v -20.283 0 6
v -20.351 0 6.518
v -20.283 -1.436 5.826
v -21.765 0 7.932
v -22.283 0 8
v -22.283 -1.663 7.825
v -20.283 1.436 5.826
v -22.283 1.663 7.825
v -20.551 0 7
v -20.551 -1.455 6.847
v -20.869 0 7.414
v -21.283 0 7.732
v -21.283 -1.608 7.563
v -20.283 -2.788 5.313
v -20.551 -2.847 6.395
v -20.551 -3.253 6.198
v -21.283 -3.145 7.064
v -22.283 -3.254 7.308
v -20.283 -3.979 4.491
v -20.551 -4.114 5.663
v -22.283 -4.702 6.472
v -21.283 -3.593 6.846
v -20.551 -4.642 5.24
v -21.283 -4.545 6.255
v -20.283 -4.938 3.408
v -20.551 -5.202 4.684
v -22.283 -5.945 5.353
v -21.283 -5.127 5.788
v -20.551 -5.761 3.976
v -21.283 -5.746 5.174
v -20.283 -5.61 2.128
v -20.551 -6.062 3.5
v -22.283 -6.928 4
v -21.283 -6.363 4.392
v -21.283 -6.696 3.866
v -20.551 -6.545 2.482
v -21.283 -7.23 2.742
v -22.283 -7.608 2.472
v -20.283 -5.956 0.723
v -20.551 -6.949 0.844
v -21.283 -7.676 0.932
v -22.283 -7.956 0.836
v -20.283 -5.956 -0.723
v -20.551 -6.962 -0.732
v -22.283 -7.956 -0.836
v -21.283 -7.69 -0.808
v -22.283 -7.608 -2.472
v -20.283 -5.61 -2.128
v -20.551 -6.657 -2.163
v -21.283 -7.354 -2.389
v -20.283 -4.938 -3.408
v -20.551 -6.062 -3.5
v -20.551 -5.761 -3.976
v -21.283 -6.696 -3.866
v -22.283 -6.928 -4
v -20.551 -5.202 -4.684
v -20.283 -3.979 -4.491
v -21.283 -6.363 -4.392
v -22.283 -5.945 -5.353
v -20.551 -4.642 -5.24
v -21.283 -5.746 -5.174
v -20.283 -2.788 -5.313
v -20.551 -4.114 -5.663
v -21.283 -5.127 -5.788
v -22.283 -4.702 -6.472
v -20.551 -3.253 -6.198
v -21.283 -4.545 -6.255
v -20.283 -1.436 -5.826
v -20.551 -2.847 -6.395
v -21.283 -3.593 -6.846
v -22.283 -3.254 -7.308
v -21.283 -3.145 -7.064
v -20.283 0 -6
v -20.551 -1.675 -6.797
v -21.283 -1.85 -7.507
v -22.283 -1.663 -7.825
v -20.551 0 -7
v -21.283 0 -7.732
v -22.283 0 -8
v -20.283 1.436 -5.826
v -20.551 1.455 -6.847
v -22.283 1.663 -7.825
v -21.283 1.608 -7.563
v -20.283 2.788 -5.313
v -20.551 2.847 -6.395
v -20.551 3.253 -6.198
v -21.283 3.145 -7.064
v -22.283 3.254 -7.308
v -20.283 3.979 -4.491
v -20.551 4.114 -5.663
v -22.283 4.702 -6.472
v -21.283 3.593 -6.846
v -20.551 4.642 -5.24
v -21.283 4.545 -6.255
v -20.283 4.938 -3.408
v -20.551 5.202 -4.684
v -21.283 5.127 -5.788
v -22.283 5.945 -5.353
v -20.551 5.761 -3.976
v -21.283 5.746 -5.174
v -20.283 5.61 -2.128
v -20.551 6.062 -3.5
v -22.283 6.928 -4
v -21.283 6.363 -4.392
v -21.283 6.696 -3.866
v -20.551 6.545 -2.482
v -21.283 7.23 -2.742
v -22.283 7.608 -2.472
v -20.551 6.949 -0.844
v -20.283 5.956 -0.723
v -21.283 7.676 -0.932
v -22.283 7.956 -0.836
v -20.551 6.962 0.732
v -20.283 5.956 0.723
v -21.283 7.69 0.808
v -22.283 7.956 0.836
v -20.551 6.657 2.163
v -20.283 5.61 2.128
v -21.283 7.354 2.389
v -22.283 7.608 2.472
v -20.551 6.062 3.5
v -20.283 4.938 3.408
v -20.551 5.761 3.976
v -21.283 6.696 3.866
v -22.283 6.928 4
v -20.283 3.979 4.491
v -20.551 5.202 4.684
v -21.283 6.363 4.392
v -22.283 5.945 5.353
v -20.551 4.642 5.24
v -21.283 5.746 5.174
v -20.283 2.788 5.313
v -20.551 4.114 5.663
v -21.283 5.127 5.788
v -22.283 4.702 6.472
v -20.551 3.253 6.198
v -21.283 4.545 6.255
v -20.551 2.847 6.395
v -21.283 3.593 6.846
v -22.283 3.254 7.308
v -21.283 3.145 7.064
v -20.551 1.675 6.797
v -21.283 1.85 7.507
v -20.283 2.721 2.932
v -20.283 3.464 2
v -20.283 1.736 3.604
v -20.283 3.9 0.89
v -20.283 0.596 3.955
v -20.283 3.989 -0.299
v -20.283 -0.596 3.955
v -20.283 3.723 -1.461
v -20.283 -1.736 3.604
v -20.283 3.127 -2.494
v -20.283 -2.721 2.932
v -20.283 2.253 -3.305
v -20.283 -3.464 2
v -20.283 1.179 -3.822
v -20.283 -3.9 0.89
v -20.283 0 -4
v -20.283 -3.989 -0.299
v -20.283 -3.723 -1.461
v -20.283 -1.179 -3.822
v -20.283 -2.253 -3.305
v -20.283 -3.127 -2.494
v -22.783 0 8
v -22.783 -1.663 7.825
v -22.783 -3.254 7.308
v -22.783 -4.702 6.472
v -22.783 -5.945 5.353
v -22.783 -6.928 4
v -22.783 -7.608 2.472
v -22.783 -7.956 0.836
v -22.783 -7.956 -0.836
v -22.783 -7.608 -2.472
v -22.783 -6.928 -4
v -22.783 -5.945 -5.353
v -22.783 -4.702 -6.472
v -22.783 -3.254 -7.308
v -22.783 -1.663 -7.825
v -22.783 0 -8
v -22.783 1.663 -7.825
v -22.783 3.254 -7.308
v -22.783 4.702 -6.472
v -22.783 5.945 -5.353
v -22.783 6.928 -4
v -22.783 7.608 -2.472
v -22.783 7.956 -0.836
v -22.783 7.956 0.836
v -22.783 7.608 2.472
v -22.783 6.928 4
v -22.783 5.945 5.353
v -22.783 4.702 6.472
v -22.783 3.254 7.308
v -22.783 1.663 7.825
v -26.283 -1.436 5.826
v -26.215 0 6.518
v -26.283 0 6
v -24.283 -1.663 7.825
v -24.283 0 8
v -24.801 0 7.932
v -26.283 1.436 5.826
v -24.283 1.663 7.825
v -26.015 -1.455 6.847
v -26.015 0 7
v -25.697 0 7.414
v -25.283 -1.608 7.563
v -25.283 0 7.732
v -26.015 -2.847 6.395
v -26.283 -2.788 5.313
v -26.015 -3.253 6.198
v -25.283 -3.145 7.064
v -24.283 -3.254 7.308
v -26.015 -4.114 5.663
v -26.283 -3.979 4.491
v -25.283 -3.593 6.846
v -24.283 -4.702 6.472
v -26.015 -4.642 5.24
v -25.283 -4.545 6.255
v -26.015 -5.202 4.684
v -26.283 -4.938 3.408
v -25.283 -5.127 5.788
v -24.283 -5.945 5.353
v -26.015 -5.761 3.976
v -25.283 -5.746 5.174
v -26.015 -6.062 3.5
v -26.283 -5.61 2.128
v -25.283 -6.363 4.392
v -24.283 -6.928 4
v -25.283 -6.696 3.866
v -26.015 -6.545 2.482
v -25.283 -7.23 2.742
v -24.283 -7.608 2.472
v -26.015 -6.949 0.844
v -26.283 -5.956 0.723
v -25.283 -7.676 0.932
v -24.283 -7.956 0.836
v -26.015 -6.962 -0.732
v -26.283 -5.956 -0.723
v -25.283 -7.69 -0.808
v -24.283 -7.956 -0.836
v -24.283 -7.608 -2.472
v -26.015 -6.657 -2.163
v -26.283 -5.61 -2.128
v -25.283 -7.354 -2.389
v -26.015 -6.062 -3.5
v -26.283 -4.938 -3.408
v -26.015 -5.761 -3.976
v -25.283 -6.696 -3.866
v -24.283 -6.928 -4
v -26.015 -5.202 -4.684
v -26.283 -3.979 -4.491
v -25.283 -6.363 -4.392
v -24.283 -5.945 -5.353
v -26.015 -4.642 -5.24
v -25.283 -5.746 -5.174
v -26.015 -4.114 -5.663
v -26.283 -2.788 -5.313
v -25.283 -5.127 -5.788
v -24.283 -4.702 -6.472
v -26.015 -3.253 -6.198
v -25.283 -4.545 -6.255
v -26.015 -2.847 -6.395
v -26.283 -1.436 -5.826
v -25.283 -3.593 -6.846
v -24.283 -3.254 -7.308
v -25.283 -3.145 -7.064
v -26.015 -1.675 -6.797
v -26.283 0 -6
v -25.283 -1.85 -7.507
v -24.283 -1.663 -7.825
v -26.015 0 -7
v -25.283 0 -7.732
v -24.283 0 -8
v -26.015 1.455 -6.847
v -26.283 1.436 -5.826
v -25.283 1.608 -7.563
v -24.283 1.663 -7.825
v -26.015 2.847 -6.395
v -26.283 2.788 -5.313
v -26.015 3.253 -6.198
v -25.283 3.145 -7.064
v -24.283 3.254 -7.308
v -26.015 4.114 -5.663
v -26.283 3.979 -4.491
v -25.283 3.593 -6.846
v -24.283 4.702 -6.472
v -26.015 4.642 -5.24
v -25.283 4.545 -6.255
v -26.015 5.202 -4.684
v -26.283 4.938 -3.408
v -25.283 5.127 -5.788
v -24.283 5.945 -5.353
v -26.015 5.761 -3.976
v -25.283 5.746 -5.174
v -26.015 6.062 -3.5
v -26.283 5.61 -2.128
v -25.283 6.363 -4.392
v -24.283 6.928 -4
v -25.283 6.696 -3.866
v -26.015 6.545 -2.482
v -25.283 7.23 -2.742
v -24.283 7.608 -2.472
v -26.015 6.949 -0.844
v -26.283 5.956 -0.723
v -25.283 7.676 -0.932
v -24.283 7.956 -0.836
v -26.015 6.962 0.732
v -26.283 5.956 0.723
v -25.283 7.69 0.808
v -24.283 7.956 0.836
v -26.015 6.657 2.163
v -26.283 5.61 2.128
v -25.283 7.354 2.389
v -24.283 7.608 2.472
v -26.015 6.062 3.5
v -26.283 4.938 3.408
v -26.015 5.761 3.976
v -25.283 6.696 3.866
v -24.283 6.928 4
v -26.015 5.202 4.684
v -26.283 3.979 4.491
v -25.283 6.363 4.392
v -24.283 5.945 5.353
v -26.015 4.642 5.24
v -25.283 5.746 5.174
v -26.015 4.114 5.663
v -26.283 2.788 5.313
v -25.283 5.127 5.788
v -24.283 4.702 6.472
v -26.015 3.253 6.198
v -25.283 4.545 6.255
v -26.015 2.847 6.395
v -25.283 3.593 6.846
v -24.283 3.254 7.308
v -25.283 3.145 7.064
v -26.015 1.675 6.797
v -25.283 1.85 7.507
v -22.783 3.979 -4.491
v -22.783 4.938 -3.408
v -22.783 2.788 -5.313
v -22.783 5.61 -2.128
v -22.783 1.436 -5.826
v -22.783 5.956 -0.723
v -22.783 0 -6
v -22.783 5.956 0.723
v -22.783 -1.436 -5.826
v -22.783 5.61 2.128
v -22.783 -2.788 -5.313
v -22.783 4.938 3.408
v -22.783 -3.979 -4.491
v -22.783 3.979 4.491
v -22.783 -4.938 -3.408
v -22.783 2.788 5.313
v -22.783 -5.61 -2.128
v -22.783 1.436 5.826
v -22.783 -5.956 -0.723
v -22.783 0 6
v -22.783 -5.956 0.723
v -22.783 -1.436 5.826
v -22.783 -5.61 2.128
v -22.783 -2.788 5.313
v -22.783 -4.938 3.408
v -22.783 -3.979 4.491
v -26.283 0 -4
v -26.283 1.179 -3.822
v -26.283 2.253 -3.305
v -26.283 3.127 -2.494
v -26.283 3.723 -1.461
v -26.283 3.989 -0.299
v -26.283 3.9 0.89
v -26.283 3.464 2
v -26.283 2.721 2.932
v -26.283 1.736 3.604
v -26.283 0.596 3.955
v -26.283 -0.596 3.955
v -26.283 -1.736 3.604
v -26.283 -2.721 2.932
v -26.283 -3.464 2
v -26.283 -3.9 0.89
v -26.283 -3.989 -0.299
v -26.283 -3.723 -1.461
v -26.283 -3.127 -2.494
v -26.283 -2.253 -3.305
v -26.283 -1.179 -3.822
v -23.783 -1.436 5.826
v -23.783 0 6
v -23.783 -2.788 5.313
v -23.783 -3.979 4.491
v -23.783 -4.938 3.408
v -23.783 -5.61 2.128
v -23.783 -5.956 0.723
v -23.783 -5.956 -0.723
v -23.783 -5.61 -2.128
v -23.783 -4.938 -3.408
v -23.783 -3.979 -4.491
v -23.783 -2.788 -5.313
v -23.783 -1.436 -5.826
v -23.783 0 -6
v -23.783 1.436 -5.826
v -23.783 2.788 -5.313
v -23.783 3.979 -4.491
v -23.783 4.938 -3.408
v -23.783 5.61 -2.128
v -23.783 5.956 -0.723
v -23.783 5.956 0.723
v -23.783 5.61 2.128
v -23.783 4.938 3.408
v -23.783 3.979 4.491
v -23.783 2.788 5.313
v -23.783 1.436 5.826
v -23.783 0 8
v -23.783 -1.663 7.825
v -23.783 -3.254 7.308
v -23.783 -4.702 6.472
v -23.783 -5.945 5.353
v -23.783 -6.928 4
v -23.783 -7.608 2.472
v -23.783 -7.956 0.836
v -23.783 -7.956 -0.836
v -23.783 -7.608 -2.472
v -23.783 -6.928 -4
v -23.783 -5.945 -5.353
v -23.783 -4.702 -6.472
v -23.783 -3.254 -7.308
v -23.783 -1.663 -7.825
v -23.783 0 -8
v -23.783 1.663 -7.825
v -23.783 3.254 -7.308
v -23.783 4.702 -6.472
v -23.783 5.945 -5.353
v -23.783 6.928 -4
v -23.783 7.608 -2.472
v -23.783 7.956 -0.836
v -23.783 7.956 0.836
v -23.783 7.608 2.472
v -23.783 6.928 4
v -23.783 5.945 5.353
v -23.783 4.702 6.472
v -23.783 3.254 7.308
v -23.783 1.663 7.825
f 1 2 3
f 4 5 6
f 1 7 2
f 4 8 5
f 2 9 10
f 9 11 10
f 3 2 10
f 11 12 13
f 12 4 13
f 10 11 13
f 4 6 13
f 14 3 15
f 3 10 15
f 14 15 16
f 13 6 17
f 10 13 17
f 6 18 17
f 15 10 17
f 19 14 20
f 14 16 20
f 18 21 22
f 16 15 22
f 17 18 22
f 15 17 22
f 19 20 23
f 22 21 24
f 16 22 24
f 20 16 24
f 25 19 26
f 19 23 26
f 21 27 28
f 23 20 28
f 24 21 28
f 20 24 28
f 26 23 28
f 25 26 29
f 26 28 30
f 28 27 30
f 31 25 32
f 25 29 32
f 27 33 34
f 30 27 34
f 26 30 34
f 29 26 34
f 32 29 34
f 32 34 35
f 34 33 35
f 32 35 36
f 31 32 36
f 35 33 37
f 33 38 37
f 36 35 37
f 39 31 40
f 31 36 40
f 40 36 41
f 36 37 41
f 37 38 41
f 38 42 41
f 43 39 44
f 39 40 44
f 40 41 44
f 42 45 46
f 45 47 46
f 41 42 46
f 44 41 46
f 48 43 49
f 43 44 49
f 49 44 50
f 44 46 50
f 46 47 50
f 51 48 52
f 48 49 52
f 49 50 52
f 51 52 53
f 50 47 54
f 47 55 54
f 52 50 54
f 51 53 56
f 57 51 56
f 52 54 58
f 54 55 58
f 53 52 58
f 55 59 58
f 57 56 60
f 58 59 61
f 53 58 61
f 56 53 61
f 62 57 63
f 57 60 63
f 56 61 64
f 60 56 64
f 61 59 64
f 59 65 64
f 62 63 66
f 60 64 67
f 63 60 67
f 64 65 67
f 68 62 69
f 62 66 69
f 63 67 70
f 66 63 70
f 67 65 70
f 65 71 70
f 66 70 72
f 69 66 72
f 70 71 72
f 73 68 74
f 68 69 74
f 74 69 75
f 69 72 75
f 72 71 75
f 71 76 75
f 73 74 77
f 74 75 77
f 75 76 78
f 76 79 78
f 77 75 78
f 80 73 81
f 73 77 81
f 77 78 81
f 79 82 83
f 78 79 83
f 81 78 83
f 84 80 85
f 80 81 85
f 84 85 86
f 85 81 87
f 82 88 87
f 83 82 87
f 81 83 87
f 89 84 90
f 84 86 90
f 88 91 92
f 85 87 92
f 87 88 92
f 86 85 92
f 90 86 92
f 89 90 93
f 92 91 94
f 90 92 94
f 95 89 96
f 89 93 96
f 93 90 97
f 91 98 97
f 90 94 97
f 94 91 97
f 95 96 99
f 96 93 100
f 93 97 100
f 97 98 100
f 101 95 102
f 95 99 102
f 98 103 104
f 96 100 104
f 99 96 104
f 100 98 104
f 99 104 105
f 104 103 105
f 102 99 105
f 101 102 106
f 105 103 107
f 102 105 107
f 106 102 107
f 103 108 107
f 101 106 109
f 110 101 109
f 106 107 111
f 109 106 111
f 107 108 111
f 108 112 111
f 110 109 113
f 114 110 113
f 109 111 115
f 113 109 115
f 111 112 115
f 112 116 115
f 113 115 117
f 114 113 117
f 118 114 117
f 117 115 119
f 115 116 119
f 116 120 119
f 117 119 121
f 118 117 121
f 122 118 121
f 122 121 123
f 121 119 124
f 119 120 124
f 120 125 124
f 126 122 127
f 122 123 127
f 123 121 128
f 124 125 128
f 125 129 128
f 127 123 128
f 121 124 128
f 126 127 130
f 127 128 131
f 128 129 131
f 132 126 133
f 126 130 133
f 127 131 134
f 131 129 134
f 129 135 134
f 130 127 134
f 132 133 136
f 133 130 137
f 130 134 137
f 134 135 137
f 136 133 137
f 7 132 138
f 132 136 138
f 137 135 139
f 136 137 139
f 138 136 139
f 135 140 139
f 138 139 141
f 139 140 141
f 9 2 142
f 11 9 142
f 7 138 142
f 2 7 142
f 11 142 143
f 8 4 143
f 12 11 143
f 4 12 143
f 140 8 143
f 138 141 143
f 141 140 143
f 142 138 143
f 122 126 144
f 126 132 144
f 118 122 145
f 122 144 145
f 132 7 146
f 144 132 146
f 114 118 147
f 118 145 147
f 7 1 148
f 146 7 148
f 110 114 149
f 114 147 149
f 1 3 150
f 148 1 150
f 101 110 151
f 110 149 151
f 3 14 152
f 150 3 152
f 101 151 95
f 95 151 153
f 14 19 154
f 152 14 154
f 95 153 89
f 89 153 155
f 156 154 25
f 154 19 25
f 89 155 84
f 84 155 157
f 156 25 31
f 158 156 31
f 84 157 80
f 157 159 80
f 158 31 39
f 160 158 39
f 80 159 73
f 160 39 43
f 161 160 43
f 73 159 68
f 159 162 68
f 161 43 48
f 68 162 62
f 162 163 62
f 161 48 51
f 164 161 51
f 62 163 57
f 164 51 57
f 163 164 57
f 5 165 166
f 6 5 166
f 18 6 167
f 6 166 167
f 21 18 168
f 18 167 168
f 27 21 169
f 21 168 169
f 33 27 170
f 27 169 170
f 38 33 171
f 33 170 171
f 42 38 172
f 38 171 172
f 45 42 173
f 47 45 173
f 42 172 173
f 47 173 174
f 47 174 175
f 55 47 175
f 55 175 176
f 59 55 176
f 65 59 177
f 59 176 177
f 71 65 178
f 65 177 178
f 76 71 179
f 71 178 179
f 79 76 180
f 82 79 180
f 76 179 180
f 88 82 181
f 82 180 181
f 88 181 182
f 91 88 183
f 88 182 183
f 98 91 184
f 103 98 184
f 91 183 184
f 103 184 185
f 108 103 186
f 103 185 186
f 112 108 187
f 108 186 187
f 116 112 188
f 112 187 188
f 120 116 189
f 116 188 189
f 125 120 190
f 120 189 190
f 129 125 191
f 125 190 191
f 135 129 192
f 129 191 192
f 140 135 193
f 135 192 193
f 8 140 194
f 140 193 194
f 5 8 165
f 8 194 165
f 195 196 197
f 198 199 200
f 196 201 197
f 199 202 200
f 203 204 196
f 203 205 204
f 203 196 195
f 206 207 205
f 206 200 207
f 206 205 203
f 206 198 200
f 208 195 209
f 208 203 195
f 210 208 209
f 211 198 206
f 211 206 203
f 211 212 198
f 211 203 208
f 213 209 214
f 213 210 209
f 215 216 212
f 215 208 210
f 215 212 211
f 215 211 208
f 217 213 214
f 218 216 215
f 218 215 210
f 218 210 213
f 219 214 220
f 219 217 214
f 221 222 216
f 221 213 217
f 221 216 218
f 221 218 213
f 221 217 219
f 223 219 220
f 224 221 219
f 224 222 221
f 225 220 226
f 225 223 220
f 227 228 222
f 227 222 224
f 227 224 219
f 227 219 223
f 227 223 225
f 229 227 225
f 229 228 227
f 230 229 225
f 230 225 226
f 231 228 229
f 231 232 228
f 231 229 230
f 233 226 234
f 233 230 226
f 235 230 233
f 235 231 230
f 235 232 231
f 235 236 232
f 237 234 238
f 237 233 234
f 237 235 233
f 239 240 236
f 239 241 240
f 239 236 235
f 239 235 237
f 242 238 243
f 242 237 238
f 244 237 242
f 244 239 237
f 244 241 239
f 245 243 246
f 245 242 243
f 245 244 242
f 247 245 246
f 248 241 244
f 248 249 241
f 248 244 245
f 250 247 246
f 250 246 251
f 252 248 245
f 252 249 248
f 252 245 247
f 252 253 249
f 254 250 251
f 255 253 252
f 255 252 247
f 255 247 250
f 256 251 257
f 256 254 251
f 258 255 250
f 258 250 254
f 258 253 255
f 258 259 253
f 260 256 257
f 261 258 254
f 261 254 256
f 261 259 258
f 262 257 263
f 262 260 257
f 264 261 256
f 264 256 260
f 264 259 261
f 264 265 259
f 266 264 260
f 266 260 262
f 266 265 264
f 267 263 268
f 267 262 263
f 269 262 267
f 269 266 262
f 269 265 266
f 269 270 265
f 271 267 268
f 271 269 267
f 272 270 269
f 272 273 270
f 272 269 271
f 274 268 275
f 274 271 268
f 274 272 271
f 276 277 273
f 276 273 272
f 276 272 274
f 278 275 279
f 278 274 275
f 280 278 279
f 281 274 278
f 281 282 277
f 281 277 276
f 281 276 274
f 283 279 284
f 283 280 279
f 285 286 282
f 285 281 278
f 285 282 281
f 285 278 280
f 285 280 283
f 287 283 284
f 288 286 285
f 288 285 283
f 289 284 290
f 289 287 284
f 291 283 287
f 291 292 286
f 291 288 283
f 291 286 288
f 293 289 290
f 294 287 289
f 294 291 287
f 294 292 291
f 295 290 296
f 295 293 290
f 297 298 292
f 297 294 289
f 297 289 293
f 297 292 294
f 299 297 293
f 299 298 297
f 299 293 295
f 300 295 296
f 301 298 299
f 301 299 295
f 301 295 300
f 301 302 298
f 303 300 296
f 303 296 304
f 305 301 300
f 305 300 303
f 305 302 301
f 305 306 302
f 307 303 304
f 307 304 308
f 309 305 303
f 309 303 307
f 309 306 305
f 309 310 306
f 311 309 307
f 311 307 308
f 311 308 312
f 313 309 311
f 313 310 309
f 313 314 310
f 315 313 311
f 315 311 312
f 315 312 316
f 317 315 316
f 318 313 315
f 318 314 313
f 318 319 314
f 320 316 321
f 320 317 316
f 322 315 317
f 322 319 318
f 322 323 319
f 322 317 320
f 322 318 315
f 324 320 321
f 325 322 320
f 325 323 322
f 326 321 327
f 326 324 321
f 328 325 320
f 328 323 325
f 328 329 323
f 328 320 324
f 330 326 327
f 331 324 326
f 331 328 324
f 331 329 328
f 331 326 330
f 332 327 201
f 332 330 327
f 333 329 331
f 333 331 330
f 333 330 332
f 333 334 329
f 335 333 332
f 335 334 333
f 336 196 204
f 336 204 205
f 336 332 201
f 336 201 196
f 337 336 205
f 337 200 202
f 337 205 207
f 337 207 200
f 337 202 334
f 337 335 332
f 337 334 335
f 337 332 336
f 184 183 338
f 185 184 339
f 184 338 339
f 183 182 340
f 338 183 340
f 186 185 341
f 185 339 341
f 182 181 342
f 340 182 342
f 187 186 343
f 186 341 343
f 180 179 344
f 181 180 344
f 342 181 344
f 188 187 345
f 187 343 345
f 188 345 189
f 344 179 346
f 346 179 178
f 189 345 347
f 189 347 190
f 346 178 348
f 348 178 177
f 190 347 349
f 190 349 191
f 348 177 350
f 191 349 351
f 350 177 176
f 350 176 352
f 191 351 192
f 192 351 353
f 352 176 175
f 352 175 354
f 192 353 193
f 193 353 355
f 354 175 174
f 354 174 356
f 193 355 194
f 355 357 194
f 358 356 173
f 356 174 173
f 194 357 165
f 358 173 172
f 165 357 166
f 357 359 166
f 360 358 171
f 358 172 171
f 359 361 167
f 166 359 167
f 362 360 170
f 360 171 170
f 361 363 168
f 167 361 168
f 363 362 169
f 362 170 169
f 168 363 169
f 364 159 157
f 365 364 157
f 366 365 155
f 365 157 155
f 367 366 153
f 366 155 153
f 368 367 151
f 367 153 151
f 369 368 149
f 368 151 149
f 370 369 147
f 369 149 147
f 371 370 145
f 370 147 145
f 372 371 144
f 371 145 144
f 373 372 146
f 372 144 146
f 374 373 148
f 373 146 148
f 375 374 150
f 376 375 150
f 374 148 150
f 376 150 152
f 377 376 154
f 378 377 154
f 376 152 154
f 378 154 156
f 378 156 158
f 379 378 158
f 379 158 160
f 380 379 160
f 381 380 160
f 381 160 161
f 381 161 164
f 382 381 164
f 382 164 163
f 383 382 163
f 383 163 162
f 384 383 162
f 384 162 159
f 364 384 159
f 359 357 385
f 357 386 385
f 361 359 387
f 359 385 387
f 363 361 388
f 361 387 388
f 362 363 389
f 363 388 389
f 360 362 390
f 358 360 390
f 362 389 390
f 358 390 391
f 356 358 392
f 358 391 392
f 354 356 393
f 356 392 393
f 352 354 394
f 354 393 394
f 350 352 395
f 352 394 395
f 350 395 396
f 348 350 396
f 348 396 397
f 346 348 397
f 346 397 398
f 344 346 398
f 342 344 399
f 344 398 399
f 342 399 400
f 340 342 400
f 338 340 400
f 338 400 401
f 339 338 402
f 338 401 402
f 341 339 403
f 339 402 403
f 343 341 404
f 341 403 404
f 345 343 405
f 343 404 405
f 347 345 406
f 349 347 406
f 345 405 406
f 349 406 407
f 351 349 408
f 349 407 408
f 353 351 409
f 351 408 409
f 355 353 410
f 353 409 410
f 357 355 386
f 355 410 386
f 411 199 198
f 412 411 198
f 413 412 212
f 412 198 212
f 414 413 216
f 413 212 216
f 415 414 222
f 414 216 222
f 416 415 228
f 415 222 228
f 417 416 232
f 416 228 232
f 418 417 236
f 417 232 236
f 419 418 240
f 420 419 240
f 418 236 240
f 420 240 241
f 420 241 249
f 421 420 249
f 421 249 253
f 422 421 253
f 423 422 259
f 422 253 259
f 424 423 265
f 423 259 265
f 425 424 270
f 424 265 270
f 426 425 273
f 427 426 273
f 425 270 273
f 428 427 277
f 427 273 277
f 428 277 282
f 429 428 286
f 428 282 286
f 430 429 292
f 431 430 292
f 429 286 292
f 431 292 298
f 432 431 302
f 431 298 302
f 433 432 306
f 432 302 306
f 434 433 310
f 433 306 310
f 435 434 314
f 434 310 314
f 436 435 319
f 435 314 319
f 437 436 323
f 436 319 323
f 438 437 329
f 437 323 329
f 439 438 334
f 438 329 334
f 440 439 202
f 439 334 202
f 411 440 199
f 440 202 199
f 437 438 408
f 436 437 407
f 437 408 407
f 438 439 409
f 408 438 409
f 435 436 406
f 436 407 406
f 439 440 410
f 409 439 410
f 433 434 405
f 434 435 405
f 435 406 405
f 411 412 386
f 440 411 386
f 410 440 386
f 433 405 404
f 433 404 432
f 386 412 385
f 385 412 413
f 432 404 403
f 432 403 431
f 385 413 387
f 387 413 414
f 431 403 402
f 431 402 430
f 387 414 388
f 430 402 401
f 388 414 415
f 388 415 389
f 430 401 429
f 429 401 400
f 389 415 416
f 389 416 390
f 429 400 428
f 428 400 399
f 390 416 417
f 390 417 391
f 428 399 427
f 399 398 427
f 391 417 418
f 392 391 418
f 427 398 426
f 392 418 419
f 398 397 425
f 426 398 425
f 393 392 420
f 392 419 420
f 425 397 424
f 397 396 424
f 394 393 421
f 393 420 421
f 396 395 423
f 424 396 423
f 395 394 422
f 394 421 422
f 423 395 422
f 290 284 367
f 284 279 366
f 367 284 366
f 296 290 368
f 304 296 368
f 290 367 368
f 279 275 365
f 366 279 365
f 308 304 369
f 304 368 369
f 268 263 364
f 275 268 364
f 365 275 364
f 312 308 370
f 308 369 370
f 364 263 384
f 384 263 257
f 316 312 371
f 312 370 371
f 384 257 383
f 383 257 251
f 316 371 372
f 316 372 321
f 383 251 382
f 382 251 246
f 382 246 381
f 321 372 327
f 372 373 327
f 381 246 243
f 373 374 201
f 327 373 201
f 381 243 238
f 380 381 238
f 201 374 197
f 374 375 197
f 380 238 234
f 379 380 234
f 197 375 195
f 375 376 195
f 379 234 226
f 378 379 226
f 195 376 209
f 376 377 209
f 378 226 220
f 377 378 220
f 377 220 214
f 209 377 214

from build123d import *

# Parameters (mm, degrees)
SKETCH_2_R          = 4
CUT_EXTRUDE_1_DEPTH = 10
FILLET_1_R          = 2


with BuildPart() as part:
    # Эскиз1 → Повернуть1 (revolve)
    with BuildSketch(Plane.XY, mode=Mode.PRIVATE) as revolve_1_sk:
        Polygon((-26.283026585, 8), (-26.283026585, 0), (-20.283026585, 0), (-20.283026585, 8), (-22.783026585, 8), (-22.783026585, 6), (-23.783026585, 6), (-23.783026585, 8), align=None)
    revolve(revolve_1_sk.sketch.rotate(Axis((-31.114528332, 0, 0), (1, 0, 0)), 90), axis=Axis((-31.114528332, 0, 0), (1, 0, 0)))

    # Эскиз2 → Вырез-Вытянуть1 (cut)
    with BuildSketch(Plane(origin=(-20.283026585, 0, 0), x_dir=(0, 0, -1), z_dir=(1, 0, 0))):
        Circle(SKETCH_2_R)
    extrude(amount=-CUT_EXTRUDE_1_DEPTH, mode=Mode.SUBTRACT)

    # Скругление1
    fillet_1_edges = [part.edges().sort_by_distance(p)[0] for p in [
        (-26.283026585, 0, -8),
        (-20.283026585, 0, -8),
    ]]
    fillet(fillet_1_edges, radius=FILLET_1_R)


solid = part.part
